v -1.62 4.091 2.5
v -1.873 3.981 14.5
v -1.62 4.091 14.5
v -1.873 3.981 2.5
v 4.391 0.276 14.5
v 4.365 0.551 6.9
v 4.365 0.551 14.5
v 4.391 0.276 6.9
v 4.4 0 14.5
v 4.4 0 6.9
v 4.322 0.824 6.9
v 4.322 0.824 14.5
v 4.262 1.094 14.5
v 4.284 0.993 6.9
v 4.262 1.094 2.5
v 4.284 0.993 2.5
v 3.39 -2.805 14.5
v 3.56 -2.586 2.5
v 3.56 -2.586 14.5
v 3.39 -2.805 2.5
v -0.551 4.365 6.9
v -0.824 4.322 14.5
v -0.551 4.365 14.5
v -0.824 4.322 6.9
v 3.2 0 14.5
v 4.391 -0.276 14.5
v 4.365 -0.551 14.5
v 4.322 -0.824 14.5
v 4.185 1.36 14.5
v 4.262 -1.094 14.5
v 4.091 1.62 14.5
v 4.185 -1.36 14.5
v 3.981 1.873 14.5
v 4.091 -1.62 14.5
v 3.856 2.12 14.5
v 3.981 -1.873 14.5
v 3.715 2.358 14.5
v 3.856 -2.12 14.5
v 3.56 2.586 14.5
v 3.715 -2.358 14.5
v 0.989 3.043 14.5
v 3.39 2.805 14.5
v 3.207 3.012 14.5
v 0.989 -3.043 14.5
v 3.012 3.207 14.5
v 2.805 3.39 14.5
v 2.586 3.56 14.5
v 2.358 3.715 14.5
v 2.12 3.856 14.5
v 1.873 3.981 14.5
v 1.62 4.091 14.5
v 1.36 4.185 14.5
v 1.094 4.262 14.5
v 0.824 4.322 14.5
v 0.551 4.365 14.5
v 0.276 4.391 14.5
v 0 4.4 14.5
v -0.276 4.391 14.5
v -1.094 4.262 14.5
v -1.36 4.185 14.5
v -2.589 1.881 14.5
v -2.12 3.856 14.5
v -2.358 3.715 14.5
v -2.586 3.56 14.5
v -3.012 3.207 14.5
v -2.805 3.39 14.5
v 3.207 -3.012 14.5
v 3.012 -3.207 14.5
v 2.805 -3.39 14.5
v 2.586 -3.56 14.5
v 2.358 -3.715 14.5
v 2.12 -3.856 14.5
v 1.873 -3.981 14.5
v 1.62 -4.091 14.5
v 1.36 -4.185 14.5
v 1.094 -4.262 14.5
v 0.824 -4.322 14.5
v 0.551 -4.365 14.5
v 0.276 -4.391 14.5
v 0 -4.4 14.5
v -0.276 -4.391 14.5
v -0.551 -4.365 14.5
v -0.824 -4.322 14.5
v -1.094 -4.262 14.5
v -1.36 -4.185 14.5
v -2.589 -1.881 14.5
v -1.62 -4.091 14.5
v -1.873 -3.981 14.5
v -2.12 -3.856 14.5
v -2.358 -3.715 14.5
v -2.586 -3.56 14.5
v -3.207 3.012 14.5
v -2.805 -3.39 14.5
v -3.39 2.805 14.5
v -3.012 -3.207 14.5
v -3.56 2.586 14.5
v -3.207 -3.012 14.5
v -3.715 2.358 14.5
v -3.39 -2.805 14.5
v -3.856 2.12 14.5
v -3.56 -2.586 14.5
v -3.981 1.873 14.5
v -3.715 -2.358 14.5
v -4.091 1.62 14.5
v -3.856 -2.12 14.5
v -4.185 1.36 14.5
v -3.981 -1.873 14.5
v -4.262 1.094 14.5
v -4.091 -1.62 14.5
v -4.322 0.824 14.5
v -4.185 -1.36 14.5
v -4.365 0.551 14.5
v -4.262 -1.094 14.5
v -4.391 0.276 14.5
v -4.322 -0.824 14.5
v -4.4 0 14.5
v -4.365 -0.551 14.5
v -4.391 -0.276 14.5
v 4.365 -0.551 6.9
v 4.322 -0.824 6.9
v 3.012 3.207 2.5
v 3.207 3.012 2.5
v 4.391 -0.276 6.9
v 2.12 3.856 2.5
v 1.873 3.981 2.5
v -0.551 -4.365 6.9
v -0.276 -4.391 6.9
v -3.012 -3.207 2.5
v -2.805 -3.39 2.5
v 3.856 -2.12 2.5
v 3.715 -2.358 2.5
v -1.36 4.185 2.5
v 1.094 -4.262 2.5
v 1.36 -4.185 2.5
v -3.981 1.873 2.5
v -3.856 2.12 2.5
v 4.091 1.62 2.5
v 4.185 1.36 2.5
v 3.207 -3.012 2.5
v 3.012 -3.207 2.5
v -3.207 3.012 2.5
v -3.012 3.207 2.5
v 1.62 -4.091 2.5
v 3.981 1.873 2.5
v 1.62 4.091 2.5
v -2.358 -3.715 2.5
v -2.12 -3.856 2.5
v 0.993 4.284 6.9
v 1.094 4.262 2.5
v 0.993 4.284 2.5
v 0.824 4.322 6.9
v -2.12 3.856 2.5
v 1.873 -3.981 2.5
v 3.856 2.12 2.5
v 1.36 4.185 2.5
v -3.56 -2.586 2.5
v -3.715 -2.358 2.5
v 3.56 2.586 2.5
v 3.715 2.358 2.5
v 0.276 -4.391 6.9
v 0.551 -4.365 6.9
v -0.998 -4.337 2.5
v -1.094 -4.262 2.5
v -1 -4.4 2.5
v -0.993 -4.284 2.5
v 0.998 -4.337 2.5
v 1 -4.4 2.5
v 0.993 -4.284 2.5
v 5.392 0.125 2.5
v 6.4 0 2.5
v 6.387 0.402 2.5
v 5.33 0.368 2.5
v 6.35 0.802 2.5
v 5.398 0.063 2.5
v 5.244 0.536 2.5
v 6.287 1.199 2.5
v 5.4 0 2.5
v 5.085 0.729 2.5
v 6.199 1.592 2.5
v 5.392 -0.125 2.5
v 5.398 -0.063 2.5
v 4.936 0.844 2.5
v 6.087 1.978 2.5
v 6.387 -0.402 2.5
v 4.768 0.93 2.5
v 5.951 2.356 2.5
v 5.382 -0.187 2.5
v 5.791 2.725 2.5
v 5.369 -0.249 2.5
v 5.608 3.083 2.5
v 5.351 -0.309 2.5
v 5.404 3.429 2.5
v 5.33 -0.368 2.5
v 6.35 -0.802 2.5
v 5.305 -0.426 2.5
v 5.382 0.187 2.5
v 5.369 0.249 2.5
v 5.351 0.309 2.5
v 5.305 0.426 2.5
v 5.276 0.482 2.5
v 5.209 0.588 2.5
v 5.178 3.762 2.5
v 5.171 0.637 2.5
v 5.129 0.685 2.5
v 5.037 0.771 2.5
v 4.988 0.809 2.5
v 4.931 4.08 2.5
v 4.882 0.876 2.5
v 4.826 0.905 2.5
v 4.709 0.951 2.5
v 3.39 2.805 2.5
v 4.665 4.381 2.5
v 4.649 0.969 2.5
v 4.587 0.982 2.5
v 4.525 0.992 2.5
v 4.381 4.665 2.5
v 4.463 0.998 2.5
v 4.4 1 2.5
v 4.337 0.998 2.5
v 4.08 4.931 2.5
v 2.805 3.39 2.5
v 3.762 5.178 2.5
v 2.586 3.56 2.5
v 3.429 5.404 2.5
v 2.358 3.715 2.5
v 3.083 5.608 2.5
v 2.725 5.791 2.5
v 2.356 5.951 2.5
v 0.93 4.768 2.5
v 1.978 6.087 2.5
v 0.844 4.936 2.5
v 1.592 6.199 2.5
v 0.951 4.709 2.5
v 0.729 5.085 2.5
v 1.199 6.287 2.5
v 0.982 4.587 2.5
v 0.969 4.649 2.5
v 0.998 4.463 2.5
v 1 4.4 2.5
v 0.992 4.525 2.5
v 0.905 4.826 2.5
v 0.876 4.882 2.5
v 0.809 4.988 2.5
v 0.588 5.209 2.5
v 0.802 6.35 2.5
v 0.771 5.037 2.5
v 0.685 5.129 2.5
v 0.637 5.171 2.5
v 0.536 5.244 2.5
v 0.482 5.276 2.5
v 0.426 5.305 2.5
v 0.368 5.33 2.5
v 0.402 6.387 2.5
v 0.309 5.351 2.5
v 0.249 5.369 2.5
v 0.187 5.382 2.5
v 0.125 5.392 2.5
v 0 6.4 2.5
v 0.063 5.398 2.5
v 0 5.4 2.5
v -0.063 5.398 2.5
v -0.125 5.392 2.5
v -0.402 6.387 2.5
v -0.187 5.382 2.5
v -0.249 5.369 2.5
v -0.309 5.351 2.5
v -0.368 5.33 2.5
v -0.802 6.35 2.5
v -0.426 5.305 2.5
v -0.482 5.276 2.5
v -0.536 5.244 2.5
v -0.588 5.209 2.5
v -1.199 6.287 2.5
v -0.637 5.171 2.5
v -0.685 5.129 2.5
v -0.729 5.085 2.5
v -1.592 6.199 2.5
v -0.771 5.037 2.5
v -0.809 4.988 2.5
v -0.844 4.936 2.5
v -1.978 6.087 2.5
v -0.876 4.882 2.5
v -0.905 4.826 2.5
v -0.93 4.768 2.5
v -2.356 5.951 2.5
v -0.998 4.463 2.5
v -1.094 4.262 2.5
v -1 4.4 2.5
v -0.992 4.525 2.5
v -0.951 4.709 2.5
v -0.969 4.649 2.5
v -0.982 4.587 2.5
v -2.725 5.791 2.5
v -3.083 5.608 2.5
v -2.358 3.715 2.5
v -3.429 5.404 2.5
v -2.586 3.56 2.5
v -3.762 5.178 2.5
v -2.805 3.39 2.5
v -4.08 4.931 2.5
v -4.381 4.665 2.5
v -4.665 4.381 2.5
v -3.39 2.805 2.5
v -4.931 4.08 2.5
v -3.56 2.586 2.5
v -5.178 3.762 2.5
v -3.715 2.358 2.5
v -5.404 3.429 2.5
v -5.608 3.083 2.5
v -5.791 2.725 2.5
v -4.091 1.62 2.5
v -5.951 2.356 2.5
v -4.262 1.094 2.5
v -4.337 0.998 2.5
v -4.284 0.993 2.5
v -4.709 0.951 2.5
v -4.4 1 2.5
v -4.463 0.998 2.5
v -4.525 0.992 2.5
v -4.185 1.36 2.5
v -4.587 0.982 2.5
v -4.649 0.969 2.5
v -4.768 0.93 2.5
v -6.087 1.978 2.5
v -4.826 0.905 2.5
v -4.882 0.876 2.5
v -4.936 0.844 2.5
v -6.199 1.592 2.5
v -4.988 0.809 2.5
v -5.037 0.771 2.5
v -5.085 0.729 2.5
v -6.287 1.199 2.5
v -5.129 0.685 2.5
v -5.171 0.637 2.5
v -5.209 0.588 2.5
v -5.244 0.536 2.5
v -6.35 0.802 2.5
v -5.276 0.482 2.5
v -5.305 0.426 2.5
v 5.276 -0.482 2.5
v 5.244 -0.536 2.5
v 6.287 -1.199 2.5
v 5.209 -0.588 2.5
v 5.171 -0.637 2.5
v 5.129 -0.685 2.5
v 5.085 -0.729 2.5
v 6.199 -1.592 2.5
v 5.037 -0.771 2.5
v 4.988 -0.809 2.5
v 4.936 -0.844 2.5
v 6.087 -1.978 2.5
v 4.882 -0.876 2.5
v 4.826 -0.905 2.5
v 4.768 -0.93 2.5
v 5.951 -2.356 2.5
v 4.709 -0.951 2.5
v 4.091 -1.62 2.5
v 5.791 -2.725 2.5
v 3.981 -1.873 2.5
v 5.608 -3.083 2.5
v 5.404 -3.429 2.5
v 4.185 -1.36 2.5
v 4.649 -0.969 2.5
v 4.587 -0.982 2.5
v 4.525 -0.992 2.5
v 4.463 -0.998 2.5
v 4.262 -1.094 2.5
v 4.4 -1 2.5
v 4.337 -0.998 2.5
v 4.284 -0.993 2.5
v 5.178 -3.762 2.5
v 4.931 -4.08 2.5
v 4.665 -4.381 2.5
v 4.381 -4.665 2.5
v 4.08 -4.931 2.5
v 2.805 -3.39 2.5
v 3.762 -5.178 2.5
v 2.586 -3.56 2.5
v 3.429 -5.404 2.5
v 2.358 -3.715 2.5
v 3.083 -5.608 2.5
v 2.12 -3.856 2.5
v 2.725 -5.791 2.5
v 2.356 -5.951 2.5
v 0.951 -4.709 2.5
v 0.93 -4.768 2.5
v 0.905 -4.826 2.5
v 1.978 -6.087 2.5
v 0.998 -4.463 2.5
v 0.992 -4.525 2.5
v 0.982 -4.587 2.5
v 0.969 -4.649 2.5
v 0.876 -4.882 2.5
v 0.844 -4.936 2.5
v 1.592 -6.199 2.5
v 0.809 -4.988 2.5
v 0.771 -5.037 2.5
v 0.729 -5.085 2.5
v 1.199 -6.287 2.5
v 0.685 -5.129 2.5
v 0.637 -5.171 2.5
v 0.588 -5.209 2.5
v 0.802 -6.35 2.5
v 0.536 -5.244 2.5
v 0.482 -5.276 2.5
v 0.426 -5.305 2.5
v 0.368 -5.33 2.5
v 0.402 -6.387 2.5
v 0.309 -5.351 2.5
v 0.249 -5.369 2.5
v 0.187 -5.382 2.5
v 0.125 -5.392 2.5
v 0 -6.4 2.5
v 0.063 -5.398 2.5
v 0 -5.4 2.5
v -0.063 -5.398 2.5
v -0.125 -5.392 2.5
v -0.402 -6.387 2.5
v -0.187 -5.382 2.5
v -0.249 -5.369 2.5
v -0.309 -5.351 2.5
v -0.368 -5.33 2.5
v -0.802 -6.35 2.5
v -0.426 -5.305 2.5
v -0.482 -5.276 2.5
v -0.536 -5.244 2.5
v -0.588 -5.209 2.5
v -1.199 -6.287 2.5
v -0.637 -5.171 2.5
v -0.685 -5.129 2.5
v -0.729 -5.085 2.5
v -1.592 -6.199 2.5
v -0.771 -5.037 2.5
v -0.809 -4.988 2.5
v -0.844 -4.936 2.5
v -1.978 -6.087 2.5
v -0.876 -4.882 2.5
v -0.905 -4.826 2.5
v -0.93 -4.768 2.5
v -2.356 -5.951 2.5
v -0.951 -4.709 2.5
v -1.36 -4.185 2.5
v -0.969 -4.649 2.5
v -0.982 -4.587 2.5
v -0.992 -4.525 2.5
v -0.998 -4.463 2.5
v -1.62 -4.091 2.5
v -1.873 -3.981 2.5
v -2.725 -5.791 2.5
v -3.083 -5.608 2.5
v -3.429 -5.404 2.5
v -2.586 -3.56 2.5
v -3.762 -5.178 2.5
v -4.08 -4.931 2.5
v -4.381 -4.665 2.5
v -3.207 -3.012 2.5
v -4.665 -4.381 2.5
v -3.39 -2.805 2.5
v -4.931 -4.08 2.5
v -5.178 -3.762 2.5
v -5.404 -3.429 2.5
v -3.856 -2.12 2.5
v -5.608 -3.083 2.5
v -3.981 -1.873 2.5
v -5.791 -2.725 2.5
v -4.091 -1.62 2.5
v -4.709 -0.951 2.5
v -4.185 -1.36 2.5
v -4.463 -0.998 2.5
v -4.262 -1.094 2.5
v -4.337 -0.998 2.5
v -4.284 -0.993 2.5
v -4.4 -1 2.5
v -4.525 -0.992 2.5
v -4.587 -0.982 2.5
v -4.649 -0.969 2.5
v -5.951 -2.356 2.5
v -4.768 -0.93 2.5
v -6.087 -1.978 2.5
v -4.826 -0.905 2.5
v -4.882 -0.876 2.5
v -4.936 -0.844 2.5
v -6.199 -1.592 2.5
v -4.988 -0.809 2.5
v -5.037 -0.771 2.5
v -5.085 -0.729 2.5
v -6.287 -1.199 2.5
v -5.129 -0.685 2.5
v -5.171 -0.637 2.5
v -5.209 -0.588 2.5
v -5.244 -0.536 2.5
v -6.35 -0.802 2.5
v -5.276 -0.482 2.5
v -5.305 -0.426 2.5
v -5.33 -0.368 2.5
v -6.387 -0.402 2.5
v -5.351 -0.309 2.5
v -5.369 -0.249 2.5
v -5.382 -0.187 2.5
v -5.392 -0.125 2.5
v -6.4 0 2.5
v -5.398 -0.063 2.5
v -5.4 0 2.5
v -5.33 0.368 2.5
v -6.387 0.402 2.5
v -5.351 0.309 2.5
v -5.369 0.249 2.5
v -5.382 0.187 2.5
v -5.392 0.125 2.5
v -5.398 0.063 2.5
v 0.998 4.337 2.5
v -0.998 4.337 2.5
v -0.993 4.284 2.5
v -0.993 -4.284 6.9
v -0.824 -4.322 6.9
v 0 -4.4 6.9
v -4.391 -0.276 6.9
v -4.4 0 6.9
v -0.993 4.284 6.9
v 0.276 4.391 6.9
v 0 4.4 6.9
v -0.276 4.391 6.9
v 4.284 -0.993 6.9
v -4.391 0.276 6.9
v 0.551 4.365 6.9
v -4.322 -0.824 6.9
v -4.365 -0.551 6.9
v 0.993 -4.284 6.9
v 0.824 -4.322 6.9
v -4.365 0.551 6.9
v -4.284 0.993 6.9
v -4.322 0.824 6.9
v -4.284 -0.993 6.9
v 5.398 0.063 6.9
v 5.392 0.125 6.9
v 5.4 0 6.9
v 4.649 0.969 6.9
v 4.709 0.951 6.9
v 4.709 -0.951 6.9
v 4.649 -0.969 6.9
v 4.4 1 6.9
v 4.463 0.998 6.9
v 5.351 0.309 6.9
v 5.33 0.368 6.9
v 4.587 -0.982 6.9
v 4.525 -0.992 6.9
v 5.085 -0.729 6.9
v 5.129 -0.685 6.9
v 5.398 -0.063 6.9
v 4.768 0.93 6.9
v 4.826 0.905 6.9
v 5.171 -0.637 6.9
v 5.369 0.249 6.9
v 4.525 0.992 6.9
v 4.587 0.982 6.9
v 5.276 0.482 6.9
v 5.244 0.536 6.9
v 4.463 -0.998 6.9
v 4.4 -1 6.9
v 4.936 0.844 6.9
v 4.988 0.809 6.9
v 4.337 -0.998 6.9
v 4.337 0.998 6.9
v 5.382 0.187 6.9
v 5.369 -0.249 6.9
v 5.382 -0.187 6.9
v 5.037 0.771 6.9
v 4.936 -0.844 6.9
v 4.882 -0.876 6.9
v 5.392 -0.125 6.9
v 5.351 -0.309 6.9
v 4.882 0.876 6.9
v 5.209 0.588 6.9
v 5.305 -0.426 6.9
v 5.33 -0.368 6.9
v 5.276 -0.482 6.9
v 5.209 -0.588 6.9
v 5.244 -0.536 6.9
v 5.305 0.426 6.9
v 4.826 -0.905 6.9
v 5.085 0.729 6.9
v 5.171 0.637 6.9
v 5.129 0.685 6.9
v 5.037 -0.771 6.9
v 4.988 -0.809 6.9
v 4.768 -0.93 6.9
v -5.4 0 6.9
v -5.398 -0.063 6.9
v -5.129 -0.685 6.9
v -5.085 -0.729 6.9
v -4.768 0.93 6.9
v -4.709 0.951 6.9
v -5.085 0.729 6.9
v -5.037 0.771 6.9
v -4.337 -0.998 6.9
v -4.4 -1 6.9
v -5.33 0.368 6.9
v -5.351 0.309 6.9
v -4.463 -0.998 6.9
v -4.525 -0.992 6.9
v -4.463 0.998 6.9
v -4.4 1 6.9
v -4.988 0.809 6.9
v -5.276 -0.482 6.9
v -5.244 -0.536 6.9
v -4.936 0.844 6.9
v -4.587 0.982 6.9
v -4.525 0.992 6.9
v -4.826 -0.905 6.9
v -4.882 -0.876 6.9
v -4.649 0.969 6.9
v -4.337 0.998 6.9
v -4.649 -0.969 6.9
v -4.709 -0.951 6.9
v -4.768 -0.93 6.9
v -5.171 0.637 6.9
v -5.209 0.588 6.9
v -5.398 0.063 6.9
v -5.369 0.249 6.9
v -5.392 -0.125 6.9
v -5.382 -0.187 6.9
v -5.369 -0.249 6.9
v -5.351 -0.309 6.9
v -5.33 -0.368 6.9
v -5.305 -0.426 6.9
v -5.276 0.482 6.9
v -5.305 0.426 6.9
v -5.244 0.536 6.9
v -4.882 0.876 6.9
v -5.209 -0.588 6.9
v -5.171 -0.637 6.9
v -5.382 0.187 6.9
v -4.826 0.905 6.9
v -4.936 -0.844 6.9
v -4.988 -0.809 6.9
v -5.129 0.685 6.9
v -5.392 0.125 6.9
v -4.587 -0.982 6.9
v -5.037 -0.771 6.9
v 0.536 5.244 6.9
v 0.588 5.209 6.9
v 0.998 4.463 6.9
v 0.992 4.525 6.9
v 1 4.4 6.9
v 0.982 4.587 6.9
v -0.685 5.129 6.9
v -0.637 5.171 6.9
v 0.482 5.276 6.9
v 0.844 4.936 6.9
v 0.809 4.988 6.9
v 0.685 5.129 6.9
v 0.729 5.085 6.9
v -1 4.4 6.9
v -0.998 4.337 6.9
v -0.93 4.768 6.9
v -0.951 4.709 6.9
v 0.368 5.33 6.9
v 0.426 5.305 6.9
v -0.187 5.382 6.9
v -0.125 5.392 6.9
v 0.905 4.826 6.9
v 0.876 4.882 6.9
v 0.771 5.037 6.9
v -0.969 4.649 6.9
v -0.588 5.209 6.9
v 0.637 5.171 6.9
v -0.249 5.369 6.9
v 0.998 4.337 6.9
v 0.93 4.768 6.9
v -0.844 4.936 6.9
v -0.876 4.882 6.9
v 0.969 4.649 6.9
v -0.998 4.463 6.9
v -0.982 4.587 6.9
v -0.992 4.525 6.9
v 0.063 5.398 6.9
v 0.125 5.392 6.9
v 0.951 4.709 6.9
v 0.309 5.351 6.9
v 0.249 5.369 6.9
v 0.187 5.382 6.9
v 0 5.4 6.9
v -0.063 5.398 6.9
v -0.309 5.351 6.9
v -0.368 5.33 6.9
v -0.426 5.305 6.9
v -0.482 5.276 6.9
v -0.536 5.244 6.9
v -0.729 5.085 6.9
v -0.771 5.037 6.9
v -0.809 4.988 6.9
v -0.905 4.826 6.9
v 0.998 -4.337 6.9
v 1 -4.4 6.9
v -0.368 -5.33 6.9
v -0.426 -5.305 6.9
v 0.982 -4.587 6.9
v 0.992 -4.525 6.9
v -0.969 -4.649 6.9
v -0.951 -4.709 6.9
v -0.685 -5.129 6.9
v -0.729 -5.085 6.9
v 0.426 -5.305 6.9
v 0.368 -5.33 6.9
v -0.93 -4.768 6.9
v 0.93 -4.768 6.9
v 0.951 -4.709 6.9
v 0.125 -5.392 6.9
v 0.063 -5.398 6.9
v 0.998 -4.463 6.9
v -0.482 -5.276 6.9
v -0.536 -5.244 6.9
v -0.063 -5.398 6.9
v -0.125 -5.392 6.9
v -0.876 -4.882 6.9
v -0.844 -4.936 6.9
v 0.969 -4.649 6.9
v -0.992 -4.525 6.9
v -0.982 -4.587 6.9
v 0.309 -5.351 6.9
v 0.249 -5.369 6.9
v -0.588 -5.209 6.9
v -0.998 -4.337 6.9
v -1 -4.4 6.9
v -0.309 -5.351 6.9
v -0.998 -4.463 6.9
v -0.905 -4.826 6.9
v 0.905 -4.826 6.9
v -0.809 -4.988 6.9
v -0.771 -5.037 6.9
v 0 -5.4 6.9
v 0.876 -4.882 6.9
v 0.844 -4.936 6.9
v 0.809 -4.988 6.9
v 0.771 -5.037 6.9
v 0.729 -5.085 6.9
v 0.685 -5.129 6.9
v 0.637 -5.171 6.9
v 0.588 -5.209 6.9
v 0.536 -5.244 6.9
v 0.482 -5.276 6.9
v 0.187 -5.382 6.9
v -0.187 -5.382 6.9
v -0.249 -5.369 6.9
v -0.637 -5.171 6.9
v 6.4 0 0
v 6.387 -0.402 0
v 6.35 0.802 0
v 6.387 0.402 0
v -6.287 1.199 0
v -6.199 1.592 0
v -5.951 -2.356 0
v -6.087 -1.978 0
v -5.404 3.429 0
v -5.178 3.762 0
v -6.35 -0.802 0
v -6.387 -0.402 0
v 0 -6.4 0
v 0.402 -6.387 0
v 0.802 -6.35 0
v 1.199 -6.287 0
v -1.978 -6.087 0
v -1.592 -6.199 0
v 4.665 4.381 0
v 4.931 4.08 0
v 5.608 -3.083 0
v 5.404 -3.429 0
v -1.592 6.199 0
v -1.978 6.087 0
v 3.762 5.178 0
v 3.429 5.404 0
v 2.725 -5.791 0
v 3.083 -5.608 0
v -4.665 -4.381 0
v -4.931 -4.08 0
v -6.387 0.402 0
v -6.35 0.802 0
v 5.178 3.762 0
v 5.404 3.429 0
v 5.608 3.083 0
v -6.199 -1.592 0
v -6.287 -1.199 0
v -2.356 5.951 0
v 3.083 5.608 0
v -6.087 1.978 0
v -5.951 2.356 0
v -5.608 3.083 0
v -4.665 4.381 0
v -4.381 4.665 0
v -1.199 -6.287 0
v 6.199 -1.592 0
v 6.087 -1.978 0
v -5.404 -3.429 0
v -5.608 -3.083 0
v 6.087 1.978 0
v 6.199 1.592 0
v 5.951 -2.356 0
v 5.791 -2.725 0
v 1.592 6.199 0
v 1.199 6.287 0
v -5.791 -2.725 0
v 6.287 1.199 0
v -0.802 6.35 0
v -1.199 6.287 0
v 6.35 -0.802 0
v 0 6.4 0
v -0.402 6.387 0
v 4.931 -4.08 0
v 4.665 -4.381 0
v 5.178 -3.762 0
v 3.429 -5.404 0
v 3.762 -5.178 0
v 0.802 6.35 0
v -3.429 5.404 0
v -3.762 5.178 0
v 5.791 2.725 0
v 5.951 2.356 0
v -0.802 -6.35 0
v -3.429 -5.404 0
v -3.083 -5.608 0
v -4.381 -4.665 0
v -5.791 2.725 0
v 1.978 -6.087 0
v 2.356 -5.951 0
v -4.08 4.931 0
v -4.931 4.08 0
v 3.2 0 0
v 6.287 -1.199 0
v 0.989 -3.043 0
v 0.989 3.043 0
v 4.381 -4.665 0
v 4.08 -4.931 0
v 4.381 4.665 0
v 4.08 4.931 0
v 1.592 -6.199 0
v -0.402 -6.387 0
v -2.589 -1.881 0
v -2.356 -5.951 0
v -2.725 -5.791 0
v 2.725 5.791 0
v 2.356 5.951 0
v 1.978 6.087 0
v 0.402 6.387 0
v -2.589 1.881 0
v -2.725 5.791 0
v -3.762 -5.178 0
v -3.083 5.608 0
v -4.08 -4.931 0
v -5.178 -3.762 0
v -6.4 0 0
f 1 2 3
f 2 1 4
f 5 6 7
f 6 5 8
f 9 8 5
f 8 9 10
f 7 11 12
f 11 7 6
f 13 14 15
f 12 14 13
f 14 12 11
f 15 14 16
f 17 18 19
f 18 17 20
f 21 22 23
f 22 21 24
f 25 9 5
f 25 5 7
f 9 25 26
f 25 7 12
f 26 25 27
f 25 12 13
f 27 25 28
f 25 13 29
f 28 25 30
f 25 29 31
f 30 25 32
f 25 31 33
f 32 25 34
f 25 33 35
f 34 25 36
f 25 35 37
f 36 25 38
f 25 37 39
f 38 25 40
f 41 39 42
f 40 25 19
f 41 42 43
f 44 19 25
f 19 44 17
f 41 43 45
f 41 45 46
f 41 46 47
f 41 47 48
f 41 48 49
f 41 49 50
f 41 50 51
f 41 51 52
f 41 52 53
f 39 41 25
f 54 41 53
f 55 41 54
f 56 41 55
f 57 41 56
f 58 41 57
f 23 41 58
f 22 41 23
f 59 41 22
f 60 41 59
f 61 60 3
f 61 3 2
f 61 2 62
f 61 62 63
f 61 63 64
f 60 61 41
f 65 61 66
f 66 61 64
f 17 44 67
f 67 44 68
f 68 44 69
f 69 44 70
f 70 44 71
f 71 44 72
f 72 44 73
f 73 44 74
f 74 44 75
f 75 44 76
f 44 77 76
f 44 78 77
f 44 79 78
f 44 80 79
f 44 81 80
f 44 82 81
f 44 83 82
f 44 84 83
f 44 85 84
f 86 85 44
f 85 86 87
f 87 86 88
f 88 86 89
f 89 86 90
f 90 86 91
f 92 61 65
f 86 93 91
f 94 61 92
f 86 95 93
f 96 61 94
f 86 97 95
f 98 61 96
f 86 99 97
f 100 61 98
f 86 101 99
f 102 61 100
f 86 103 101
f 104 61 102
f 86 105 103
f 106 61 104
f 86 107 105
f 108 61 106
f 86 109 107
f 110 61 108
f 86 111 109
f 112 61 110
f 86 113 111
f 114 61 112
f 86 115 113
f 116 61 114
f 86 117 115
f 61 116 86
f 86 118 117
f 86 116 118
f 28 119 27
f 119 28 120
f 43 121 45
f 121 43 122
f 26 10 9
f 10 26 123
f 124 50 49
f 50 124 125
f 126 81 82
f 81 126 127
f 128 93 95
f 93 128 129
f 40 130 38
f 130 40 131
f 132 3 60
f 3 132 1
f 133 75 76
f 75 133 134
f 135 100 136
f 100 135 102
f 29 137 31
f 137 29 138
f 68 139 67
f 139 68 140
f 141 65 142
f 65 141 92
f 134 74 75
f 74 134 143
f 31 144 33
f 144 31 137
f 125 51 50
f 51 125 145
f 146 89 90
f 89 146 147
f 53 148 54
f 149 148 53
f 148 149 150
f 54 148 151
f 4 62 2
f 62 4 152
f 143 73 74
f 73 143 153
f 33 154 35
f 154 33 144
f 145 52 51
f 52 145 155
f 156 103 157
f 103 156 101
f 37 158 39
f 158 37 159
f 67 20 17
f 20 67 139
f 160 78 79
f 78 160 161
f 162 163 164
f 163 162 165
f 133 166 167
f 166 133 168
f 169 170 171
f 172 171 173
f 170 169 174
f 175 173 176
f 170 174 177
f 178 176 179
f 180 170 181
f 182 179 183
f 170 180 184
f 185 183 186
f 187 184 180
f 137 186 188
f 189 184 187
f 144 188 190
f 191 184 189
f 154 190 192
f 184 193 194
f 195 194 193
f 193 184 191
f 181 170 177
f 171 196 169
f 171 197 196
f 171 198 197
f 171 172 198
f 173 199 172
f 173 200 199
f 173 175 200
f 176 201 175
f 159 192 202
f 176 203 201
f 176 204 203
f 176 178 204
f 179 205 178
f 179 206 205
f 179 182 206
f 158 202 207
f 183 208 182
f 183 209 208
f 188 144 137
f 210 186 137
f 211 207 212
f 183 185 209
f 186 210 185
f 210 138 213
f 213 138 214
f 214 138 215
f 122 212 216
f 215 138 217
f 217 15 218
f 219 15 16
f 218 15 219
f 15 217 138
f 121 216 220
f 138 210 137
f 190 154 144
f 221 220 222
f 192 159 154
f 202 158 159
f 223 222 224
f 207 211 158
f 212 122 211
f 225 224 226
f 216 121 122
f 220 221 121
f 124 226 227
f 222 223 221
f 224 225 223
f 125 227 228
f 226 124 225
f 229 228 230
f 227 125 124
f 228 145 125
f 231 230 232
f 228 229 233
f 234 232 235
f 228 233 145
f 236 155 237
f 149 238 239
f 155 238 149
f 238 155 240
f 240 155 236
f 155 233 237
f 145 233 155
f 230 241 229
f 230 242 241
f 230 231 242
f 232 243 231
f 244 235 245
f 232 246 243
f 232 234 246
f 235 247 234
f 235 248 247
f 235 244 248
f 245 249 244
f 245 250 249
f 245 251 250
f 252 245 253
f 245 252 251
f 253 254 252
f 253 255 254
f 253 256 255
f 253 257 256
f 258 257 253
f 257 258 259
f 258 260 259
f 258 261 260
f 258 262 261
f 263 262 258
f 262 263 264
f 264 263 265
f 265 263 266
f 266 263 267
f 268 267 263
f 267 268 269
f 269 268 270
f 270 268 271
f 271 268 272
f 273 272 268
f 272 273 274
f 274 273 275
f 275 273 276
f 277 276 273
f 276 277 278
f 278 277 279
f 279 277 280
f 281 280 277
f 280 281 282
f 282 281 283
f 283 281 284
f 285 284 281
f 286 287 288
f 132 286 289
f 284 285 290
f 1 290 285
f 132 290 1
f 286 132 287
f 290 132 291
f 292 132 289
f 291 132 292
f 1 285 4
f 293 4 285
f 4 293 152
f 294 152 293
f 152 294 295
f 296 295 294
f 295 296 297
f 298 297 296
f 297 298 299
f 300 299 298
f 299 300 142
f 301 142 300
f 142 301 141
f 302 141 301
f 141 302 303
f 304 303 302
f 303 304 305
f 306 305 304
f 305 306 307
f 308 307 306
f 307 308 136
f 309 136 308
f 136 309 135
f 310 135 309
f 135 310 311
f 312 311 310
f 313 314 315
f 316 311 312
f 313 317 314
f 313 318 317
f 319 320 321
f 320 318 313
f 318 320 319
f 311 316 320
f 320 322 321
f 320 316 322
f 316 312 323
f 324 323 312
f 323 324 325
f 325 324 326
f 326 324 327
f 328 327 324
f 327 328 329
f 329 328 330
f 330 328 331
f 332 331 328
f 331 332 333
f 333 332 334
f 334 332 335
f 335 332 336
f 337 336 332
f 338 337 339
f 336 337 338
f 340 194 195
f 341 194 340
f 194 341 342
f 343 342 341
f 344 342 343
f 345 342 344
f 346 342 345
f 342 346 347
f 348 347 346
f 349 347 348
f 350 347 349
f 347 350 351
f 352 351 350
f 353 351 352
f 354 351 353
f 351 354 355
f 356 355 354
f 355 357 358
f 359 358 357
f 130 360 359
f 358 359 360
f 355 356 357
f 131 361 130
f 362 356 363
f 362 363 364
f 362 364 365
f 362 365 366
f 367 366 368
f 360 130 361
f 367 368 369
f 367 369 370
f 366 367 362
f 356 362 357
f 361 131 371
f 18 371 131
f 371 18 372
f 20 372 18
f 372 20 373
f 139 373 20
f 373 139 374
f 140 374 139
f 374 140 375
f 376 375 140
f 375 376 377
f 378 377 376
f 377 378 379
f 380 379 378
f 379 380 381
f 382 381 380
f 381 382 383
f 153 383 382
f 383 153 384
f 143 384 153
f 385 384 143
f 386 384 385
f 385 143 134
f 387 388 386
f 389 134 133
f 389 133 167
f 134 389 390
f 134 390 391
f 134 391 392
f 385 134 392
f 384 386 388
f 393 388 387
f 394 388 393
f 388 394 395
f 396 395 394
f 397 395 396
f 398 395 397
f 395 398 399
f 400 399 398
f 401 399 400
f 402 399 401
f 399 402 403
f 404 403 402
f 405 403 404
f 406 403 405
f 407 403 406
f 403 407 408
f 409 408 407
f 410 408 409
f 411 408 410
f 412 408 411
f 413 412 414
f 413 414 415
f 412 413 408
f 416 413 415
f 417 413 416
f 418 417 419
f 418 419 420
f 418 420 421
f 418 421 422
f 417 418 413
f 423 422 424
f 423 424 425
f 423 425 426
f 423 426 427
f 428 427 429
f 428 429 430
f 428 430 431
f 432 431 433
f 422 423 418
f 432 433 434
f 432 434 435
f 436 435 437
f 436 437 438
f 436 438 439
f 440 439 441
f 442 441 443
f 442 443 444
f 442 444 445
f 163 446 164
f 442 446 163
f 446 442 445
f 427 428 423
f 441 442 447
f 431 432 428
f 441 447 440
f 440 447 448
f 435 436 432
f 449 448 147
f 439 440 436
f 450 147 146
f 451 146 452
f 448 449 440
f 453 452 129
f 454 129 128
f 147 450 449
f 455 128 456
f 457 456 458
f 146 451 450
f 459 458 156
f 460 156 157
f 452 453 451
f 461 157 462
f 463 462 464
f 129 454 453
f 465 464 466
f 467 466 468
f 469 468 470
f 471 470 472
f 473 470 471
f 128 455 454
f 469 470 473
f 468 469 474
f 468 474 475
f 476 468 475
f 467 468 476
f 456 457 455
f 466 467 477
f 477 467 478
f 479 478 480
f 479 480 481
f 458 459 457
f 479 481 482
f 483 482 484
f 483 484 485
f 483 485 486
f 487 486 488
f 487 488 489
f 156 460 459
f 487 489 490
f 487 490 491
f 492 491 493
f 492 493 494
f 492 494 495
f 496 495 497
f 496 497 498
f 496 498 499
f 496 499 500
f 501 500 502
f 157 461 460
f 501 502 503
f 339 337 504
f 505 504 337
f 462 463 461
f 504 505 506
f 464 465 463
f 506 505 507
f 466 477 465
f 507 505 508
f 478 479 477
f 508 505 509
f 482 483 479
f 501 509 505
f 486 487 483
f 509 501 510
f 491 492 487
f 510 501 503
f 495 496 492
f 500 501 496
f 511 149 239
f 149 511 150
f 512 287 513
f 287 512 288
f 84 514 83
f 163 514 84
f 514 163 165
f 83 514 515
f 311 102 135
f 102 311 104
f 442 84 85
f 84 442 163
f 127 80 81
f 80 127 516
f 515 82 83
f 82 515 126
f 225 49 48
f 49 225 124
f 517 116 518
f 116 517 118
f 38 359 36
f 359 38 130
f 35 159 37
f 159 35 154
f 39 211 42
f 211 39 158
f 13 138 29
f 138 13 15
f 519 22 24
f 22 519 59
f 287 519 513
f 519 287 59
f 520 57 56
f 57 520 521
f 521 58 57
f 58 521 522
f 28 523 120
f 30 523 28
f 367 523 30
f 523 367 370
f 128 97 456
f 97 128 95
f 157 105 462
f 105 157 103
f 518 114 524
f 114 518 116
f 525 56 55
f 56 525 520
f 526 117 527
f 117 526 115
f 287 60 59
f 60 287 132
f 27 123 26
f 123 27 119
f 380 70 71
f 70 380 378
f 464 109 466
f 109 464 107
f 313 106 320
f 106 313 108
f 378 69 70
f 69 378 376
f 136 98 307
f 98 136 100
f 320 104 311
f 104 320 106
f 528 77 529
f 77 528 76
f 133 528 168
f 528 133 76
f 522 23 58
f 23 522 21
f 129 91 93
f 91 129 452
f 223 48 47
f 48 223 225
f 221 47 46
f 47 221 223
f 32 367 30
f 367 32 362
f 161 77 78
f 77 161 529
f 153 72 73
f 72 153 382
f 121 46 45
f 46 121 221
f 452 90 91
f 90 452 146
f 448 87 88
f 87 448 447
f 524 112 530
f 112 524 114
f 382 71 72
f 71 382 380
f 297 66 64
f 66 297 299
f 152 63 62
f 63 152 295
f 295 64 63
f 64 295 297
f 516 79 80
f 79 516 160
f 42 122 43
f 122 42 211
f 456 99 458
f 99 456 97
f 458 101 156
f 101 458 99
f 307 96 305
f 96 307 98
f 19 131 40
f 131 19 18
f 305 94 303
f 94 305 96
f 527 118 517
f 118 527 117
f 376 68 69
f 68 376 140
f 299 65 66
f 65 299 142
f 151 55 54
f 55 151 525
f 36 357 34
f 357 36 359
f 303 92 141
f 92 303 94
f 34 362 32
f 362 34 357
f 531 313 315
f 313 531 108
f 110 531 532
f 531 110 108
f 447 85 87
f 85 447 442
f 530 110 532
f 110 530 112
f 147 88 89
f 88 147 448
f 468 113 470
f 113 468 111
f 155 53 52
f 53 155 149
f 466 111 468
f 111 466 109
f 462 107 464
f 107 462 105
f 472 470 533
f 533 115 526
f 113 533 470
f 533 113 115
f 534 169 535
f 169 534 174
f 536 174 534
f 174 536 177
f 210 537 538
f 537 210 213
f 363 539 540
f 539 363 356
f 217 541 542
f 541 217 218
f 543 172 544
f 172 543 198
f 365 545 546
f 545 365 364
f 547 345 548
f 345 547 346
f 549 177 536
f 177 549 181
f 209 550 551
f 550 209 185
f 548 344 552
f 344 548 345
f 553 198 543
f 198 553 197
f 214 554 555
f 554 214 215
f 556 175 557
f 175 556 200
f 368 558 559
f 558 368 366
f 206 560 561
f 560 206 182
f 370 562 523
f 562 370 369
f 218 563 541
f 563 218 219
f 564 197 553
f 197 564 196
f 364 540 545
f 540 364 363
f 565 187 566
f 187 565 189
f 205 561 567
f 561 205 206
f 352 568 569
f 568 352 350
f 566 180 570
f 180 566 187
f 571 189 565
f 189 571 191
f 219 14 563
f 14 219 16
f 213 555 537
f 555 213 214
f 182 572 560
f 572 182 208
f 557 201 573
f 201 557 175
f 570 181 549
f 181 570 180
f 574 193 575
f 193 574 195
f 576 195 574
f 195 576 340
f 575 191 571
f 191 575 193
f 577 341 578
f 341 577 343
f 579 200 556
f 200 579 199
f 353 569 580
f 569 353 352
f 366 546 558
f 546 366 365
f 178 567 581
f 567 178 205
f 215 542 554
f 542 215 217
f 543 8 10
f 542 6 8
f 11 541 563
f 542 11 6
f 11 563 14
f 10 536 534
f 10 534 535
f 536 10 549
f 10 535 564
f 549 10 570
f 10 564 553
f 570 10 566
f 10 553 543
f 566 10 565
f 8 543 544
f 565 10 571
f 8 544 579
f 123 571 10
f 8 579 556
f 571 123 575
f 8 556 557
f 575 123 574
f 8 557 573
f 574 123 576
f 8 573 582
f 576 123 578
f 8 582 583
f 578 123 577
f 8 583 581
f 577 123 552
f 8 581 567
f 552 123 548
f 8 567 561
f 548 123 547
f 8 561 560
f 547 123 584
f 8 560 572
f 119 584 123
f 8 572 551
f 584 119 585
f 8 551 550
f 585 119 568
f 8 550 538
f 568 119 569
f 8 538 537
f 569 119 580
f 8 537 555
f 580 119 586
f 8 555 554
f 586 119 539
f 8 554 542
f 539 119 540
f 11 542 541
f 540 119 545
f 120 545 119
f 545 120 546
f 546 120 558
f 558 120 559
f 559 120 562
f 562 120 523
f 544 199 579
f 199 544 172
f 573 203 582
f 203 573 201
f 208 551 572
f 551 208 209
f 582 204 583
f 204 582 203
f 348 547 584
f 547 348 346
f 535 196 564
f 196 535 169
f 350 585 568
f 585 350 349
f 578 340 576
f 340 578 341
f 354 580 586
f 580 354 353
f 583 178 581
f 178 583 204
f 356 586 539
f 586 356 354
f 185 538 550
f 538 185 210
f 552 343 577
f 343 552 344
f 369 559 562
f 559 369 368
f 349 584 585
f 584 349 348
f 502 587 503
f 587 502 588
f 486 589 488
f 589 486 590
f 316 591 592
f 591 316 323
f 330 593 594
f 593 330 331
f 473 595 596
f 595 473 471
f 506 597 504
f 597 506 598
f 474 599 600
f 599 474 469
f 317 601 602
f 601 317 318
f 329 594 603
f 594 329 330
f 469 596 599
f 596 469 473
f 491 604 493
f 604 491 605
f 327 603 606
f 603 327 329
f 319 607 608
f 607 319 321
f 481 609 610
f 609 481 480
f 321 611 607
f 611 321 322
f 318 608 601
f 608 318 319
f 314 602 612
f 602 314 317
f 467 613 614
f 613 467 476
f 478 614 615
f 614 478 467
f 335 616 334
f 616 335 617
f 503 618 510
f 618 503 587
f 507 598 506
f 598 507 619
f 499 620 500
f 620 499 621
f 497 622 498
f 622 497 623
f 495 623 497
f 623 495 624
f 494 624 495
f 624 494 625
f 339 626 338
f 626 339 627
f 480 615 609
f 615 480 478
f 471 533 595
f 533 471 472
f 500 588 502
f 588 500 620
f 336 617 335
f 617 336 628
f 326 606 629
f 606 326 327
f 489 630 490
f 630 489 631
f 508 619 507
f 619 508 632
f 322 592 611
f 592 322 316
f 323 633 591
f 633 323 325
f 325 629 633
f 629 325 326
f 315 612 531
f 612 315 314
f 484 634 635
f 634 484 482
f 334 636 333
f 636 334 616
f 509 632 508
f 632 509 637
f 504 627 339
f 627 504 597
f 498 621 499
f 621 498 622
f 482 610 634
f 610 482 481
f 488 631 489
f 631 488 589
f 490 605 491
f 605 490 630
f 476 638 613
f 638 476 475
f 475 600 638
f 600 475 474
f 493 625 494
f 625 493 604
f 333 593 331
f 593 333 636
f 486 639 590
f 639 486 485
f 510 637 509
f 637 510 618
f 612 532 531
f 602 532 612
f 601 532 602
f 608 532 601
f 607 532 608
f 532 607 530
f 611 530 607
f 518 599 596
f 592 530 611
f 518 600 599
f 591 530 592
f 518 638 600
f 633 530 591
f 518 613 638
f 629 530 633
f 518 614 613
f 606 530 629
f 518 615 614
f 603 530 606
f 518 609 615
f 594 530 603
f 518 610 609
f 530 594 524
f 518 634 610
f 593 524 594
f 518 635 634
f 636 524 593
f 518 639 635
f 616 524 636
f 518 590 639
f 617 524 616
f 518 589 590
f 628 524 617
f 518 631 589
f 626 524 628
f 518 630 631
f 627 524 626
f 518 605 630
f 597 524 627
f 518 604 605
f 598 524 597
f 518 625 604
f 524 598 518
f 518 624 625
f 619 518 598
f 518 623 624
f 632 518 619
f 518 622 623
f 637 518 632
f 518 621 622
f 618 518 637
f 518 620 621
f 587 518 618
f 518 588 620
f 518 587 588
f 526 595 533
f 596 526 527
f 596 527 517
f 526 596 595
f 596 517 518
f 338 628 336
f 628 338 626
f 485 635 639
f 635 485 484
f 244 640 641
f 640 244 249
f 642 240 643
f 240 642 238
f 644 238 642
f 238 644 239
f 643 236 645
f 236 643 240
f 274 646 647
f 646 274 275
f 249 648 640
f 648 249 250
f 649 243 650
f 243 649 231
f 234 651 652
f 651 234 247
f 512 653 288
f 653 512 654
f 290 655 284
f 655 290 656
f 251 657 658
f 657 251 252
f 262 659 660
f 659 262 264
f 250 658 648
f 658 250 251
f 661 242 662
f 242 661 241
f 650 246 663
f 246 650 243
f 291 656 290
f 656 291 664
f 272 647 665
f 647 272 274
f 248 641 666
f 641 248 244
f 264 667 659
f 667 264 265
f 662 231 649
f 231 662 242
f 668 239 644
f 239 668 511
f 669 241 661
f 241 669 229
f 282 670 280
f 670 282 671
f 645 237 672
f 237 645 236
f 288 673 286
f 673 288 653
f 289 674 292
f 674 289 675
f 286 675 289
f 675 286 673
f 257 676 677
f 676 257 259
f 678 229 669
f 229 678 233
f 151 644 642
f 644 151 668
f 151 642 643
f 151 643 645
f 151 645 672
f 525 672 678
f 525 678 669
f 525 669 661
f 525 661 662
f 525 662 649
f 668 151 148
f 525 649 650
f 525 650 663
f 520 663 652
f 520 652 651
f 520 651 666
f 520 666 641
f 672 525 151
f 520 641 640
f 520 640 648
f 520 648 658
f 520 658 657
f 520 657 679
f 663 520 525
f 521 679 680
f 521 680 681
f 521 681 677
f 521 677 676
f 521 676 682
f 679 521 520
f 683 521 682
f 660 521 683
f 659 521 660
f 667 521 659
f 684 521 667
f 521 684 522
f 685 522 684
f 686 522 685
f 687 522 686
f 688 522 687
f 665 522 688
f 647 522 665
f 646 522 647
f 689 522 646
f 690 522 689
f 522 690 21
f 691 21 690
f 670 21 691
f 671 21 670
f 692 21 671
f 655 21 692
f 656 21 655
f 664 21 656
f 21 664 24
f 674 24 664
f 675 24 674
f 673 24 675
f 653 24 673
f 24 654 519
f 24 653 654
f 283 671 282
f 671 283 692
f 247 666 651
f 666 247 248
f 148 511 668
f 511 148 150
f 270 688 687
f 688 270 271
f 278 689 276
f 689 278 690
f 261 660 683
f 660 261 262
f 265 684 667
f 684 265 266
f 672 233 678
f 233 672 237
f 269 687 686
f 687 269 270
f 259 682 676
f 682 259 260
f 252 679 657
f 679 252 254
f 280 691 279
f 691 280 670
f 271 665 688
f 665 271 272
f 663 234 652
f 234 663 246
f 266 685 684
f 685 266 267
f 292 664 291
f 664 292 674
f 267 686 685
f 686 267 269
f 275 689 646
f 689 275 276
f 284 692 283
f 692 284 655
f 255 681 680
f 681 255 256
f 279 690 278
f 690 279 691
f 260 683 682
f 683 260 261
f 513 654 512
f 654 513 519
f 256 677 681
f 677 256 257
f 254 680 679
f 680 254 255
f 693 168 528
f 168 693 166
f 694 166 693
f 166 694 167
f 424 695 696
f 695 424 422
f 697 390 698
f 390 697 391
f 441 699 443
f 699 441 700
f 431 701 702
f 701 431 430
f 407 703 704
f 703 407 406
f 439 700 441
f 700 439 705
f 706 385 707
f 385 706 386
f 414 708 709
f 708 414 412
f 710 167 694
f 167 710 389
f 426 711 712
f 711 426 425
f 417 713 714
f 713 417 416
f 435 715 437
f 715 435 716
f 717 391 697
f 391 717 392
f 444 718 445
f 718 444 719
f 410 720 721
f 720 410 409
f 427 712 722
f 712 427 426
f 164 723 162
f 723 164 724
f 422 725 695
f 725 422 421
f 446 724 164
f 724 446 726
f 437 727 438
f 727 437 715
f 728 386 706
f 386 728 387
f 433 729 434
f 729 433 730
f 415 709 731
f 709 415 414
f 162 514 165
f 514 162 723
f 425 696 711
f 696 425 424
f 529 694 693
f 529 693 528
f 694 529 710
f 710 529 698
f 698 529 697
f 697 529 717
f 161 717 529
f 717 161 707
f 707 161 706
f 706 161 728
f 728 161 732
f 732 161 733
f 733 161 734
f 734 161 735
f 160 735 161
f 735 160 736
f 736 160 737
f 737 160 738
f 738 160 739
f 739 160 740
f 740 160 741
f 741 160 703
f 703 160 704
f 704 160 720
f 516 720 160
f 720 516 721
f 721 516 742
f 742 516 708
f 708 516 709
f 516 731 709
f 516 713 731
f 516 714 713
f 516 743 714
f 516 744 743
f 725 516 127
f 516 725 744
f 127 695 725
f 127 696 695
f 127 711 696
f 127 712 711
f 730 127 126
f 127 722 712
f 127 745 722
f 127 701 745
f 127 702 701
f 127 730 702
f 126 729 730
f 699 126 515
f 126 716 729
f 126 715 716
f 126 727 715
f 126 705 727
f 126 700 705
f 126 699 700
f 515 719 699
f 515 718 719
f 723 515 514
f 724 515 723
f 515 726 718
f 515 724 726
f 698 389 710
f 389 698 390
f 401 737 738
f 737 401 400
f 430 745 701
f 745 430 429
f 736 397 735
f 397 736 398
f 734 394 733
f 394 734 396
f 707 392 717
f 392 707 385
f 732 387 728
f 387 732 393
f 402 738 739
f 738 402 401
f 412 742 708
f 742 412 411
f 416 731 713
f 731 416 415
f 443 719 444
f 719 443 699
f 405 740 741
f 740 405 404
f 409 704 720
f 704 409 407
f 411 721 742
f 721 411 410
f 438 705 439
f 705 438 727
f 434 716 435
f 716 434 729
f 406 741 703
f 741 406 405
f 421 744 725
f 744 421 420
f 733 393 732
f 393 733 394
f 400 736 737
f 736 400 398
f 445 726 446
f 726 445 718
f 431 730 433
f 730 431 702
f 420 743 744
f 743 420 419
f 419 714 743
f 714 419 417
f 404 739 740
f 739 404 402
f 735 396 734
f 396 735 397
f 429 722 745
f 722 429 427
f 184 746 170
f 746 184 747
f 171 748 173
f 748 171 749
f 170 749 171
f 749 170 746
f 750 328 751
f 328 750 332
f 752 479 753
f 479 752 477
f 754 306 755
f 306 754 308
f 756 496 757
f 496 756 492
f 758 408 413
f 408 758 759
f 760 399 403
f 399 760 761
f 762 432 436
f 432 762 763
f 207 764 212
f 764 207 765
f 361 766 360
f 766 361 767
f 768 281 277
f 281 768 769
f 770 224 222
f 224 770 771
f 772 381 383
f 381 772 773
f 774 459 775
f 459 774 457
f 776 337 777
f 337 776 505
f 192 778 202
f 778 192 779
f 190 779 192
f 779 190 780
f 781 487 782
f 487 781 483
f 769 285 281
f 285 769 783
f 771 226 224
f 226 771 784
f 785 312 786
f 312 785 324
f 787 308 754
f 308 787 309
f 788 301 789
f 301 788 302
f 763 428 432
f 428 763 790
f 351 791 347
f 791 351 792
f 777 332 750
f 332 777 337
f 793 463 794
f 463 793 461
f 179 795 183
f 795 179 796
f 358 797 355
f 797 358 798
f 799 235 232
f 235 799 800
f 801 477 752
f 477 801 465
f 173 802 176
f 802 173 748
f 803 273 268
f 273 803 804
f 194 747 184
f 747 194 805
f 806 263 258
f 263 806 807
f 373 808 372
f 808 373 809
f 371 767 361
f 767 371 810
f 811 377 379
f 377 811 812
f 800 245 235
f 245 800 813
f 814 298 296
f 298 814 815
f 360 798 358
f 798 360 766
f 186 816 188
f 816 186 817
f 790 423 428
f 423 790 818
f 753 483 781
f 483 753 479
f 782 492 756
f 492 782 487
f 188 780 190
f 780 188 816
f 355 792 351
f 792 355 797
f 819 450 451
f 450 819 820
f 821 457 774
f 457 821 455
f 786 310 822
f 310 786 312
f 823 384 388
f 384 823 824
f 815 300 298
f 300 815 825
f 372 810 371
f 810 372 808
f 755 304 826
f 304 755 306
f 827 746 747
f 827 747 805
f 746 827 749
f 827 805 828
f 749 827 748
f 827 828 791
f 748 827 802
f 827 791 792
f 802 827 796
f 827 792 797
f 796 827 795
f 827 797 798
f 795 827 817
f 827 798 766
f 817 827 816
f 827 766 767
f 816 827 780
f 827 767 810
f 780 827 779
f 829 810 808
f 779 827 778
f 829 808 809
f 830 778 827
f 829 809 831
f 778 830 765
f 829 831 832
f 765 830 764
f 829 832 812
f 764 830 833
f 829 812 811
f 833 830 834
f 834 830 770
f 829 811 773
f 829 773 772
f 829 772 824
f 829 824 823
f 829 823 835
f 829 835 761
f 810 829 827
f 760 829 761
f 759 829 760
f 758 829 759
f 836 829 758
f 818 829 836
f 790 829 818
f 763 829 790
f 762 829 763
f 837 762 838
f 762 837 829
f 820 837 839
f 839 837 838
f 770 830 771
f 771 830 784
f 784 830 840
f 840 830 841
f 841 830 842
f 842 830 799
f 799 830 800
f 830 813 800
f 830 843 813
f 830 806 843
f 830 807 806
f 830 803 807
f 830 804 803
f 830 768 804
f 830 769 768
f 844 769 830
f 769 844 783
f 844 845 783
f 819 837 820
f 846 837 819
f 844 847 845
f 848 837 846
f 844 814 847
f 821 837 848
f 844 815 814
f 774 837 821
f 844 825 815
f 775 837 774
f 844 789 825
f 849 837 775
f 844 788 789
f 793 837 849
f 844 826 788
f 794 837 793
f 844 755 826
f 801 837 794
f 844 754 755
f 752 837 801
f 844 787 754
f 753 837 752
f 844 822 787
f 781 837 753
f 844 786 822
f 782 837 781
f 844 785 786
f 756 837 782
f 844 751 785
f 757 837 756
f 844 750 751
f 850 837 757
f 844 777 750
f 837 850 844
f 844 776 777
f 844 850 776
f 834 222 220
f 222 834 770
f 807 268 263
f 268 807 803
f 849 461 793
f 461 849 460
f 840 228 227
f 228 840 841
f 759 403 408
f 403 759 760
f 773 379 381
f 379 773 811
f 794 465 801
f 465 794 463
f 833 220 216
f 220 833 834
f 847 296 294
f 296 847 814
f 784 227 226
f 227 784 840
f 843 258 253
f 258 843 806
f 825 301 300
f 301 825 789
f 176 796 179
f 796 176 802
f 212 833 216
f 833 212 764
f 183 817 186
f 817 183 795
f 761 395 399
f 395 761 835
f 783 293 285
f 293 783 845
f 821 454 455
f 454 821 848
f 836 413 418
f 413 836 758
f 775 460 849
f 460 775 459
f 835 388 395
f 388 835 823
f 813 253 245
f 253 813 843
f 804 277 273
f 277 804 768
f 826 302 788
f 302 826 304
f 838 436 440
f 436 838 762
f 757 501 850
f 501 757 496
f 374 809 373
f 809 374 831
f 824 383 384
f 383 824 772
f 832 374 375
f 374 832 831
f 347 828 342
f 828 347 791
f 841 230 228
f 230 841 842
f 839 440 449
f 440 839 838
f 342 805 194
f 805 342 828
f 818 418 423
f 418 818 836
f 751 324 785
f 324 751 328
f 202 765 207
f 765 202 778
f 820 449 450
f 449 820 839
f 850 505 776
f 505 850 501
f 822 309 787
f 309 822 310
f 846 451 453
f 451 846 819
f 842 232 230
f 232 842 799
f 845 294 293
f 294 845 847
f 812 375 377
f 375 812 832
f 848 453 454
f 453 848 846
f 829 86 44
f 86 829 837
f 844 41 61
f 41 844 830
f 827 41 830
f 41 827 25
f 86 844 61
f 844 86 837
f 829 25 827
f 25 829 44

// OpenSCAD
$fn = 100;

difference() {
  union() {
    cylinder(r = 6.4, h = 2.5);

    translate([0, 0, 2.5]) {
      rad = 4.4;

      cylinder(r = rad, h = 12);
      translate([rad, 0]) cylinder(r = 1, h = rad);
      translate([-rad, 0]) cylinder(r = 1, h = rad);
      translate([0, rad]) cylinder(r = 1, h = rad);
      translate([0, -rad]) cylinder(r = 1, h = rad);
    }
  }

  translate([0, 0, -0.5]) cylinder(r = 3.2, h = 15.5, $fn = 5);
}
